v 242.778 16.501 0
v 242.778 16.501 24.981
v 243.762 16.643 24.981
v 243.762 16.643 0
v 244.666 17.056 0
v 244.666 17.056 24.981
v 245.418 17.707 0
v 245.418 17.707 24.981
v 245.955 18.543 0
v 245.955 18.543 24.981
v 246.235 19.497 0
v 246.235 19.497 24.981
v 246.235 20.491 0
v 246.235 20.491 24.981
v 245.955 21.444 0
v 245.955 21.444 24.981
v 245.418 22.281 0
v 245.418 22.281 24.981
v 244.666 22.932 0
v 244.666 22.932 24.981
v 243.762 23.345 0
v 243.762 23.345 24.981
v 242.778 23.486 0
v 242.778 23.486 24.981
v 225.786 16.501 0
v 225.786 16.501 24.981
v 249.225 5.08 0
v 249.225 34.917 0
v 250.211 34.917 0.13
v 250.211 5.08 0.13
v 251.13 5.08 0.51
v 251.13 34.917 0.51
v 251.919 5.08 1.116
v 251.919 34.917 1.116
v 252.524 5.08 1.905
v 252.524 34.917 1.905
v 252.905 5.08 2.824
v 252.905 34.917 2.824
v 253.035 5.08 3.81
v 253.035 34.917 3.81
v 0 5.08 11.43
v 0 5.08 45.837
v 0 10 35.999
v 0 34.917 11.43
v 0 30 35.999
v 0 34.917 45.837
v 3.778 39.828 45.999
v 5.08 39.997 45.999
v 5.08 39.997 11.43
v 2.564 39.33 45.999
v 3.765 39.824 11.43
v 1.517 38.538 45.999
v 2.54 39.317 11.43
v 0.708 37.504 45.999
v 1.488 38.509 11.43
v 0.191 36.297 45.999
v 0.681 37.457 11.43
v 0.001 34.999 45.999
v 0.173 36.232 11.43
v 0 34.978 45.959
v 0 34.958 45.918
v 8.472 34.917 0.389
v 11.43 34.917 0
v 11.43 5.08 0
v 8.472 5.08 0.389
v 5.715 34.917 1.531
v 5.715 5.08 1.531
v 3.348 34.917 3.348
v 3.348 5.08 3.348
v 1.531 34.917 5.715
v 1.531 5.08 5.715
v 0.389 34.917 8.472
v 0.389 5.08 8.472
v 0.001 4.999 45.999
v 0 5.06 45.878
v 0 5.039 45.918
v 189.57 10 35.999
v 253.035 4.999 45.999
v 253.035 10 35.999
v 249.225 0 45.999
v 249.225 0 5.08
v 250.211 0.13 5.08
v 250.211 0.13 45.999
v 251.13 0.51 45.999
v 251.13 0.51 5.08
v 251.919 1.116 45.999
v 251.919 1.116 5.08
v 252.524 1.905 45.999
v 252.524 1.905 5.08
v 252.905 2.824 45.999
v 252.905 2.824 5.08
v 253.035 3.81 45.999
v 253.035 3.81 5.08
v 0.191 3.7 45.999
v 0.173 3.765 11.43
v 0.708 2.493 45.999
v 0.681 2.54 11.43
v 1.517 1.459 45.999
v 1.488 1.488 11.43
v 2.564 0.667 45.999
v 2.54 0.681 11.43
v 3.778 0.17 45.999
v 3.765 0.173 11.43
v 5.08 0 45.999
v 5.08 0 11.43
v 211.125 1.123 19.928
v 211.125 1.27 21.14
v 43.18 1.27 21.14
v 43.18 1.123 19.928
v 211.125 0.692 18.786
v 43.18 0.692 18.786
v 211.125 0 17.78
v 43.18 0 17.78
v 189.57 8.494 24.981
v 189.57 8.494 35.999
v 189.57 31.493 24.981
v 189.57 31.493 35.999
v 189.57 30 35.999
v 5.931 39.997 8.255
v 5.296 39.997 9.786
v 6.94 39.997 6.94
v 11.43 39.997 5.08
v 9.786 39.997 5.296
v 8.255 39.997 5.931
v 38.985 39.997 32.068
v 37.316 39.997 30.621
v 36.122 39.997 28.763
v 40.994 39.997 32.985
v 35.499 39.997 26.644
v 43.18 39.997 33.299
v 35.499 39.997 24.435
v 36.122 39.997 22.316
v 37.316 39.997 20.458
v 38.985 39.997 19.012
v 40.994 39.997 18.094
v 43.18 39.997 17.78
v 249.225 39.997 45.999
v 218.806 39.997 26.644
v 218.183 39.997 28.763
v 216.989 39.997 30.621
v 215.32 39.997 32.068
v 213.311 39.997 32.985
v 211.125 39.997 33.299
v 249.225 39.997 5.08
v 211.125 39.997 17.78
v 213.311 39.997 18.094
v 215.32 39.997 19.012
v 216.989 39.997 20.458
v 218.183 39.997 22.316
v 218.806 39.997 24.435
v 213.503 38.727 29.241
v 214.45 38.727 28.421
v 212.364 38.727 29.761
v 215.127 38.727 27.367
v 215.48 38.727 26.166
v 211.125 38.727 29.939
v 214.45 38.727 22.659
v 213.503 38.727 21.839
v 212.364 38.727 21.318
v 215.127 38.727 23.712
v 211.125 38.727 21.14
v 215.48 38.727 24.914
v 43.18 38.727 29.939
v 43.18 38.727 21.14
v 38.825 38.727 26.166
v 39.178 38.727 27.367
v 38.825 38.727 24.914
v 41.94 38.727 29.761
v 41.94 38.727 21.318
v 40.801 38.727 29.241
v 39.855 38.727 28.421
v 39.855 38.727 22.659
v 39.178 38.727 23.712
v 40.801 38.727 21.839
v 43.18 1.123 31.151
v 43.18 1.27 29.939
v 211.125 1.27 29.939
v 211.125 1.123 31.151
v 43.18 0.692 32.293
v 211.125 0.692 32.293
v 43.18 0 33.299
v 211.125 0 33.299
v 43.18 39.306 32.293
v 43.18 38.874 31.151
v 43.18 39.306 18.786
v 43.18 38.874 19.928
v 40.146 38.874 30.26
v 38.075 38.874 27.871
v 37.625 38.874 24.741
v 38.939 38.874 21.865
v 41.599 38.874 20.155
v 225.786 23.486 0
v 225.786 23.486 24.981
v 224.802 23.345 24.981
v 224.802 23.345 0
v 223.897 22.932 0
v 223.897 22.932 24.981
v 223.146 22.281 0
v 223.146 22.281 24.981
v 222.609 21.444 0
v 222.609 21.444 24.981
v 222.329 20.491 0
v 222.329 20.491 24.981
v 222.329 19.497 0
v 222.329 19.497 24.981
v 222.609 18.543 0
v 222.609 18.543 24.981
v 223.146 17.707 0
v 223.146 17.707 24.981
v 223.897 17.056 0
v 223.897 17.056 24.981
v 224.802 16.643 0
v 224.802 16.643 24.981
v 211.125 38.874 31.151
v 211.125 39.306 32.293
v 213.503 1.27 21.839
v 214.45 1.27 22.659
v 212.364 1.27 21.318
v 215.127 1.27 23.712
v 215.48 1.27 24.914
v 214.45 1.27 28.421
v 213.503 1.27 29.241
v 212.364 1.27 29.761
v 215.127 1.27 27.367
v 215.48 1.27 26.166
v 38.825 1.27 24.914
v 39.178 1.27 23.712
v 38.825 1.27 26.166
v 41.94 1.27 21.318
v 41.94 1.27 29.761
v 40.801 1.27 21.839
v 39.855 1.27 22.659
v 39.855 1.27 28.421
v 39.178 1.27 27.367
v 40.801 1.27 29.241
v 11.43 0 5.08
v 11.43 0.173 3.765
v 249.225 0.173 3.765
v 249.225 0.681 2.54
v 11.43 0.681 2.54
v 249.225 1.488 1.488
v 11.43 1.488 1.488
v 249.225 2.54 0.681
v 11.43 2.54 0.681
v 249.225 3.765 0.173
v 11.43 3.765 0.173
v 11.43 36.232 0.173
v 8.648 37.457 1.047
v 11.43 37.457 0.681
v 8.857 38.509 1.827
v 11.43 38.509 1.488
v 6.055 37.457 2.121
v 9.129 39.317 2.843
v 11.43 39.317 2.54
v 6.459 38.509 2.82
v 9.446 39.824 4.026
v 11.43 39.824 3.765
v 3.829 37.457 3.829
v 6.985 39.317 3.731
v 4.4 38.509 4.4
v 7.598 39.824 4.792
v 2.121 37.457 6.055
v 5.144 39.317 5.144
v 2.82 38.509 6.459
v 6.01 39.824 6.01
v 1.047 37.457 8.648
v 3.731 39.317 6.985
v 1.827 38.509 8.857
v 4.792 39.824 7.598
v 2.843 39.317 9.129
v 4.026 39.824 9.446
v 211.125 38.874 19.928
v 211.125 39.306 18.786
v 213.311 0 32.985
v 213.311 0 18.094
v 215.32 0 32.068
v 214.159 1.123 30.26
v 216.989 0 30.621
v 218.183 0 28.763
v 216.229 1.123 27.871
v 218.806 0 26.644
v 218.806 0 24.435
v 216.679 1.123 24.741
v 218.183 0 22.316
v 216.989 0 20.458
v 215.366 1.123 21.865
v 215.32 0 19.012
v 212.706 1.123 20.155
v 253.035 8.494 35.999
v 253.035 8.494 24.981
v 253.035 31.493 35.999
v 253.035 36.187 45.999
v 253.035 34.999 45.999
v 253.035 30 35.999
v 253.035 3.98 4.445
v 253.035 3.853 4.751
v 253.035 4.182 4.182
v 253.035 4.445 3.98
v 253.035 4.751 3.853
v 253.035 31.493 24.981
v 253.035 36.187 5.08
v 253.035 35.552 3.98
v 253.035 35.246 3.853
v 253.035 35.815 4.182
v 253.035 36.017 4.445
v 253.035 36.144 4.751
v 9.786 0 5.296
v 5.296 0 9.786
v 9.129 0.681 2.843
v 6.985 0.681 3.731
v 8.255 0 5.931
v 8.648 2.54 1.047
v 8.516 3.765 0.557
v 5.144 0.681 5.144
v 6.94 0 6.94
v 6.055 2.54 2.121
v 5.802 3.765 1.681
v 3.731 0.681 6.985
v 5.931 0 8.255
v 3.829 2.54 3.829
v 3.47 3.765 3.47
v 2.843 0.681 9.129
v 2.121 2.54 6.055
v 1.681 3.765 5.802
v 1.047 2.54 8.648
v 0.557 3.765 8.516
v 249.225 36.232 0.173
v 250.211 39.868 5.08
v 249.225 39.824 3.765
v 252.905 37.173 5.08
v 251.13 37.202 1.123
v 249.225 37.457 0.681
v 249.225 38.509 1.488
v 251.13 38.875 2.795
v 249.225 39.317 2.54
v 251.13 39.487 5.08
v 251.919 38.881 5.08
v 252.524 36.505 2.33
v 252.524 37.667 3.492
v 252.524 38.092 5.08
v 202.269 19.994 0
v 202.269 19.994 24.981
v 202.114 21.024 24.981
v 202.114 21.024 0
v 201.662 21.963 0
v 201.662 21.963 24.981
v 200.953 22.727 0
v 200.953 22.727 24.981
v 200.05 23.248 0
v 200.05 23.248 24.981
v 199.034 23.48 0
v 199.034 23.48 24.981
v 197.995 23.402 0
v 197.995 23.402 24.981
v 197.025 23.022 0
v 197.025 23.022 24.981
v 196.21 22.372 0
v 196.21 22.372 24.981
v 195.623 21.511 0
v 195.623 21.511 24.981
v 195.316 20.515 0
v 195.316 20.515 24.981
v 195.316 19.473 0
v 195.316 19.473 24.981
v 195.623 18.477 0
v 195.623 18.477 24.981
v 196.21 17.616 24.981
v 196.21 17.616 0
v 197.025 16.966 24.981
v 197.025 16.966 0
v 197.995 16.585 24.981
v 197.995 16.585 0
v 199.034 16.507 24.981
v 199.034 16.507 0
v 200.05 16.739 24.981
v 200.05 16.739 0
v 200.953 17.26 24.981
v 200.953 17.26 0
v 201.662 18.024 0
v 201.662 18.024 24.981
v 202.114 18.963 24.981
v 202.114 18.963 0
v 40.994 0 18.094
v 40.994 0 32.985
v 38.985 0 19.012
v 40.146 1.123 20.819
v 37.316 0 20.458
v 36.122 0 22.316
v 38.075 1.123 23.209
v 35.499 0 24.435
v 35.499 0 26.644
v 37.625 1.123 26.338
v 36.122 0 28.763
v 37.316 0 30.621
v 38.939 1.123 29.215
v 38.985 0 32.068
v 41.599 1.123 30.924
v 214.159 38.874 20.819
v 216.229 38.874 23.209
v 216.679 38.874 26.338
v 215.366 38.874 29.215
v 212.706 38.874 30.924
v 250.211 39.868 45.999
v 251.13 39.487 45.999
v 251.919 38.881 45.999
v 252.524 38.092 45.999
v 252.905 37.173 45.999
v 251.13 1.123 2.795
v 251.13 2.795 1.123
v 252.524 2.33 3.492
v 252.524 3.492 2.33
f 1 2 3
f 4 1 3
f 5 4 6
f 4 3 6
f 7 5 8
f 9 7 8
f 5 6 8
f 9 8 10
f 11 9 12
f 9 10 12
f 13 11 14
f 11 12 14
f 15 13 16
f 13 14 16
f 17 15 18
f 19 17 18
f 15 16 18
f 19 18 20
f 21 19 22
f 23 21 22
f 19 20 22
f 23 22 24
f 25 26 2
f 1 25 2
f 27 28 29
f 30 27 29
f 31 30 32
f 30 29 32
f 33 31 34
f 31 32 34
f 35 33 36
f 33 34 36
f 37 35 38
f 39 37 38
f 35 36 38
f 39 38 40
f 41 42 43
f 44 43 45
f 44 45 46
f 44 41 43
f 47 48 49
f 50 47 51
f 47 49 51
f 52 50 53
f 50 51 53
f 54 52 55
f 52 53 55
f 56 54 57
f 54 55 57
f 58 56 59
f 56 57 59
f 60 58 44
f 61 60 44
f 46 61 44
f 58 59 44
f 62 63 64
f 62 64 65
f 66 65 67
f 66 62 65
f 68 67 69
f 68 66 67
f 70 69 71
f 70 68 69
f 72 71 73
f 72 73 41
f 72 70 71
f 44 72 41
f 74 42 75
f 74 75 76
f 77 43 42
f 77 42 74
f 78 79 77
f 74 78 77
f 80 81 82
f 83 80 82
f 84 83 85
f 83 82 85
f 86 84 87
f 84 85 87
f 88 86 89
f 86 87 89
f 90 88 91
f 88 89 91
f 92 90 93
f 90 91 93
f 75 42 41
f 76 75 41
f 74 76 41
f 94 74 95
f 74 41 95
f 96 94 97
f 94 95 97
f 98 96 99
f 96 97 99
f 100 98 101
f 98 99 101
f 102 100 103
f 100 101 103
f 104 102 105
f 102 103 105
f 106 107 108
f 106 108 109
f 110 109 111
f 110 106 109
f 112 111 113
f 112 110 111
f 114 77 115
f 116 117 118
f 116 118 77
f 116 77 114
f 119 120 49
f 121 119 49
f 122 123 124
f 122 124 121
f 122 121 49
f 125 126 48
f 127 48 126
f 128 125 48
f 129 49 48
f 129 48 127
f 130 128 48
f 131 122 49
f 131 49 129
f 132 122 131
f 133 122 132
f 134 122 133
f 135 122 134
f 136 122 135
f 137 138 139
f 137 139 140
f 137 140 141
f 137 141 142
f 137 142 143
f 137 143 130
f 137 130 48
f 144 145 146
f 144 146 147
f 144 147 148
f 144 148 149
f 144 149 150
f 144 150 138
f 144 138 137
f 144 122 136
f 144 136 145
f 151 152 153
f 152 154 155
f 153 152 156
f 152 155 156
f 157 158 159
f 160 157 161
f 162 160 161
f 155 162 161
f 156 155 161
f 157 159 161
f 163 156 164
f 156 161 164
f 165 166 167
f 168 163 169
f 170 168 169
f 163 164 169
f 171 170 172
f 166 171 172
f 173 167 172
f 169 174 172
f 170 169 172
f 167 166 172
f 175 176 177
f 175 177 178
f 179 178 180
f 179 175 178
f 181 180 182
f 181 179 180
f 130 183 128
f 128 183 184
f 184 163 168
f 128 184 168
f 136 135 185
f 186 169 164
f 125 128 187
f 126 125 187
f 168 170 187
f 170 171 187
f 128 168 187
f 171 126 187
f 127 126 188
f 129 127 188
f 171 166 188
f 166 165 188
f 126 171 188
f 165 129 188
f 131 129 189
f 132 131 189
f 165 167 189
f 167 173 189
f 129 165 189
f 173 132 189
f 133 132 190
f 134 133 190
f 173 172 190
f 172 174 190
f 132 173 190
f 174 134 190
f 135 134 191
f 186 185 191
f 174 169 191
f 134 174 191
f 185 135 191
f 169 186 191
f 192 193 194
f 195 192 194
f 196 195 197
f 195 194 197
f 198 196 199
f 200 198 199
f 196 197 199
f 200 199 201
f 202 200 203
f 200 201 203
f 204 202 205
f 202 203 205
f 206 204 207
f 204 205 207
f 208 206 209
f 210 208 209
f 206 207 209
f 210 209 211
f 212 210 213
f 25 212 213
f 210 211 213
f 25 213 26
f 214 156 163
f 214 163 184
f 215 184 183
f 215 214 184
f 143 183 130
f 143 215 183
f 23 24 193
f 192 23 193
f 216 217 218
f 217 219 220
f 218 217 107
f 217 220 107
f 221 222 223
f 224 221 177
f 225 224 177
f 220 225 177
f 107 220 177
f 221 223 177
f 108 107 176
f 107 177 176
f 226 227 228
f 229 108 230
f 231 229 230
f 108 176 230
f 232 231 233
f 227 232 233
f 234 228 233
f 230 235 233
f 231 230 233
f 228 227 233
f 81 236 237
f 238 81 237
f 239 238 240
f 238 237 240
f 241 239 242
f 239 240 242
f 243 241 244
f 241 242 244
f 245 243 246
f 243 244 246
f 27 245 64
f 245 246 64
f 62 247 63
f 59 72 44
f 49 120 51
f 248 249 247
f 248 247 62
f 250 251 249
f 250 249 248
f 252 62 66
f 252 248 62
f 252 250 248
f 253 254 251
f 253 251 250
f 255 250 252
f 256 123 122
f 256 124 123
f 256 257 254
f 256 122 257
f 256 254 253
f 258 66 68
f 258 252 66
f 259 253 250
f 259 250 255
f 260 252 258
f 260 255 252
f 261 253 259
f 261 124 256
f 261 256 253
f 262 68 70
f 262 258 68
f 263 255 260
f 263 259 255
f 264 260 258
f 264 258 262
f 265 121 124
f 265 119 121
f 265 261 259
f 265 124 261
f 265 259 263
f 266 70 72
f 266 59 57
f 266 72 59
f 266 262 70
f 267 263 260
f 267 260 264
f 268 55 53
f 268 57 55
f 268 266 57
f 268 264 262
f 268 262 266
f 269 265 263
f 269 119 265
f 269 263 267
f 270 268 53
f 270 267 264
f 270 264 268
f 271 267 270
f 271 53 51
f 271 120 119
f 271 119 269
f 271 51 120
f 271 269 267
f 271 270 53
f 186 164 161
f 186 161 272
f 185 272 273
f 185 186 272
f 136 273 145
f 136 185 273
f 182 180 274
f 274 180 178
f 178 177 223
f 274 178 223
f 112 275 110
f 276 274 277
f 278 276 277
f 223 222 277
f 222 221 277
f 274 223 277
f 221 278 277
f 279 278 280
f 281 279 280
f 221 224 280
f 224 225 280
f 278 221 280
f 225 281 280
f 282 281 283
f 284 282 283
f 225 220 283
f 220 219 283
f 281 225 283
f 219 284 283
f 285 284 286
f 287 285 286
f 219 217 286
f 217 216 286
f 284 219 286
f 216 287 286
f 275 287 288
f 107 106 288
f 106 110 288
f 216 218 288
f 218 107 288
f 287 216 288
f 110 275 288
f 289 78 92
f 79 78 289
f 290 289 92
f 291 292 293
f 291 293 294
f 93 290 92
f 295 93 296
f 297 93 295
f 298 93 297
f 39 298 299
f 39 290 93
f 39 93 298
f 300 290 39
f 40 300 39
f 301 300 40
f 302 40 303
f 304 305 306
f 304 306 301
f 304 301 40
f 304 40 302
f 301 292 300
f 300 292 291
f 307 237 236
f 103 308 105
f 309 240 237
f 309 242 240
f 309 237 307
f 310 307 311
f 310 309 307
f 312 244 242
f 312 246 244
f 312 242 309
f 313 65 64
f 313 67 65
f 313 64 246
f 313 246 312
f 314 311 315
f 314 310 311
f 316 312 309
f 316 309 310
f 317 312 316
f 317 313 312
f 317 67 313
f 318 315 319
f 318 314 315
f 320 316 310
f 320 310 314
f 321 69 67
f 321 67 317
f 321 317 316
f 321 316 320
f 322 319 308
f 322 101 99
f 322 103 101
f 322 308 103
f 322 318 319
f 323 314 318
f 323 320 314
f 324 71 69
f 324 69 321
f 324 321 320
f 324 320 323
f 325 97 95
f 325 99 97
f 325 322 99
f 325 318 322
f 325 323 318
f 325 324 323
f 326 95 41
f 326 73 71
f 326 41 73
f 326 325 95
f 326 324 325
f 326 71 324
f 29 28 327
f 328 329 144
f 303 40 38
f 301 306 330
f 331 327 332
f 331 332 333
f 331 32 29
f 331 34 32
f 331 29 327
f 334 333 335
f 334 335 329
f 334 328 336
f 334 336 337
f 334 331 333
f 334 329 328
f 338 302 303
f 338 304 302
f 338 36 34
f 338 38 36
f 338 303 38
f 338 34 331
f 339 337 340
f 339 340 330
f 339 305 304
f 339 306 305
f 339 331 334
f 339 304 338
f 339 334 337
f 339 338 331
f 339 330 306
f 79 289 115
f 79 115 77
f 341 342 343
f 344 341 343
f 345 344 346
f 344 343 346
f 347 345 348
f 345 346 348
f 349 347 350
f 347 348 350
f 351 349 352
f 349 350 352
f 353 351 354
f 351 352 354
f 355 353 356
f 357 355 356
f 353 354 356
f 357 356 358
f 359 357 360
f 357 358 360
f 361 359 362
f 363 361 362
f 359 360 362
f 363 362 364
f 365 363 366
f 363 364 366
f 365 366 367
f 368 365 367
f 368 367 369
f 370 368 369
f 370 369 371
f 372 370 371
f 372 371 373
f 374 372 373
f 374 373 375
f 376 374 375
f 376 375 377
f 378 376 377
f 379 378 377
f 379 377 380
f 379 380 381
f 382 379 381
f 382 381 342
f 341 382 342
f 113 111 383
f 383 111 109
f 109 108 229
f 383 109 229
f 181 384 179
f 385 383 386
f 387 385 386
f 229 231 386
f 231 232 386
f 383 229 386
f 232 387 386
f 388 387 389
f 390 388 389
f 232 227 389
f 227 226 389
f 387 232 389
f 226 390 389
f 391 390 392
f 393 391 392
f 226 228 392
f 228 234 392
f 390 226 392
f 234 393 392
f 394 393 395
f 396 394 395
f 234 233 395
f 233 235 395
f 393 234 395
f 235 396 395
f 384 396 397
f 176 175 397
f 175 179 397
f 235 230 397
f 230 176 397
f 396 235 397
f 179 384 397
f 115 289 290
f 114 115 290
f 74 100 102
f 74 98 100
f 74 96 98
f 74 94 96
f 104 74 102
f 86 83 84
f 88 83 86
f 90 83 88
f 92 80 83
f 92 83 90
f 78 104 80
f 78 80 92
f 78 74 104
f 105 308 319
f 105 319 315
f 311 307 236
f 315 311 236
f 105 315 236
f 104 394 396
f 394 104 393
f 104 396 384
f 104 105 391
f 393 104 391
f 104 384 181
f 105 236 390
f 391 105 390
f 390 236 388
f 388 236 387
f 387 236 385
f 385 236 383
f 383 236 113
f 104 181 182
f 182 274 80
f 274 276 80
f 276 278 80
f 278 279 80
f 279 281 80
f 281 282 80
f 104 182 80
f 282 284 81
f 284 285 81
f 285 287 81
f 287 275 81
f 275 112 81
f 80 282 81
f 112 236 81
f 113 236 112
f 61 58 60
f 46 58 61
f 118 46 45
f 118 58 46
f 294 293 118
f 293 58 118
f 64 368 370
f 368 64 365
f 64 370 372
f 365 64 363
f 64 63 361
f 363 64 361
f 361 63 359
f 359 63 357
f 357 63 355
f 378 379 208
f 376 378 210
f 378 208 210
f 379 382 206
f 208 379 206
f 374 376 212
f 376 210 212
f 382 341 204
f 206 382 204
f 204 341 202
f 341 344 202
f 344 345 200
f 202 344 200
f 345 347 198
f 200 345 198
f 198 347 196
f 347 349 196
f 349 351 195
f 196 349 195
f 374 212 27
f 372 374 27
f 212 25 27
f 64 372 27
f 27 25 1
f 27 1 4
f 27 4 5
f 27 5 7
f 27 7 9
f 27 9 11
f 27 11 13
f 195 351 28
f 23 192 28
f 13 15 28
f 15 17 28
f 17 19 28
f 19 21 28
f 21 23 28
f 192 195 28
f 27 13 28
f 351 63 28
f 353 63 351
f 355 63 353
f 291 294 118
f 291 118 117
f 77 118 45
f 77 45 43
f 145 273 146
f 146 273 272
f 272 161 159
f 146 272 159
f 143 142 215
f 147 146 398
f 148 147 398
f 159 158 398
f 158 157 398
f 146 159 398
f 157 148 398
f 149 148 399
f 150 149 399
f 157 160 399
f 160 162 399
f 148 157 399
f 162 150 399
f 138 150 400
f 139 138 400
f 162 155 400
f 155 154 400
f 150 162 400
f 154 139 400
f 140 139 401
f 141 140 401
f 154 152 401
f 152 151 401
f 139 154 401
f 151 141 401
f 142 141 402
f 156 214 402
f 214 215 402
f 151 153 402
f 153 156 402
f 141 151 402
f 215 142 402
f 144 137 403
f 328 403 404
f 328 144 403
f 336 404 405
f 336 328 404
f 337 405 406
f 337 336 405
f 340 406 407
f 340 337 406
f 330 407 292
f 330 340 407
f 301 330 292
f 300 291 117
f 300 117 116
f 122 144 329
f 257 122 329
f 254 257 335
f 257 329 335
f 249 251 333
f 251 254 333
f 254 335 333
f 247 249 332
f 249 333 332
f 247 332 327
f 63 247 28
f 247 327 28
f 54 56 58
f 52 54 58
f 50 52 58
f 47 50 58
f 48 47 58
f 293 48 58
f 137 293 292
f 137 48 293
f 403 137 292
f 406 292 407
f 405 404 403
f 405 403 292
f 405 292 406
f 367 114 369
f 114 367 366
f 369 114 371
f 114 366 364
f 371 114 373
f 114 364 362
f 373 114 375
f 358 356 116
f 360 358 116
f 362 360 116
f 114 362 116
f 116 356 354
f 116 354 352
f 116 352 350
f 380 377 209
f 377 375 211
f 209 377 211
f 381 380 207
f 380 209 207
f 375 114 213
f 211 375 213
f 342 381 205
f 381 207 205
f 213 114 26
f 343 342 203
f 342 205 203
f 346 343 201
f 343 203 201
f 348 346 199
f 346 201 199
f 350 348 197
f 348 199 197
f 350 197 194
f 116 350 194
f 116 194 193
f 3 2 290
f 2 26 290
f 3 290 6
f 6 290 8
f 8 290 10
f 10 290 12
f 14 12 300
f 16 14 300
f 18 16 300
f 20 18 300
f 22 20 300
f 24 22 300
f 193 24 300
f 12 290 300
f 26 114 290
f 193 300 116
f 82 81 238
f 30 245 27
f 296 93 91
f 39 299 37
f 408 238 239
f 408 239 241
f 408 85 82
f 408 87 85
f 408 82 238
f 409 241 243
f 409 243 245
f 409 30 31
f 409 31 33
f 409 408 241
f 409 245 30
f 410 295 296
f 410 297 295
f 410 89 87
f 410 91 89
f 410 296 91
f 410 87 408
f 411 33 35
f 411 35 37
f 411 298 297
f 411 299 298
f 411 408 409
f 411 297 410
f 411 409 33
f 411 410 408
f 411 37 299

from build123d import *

# Parameters (mm, degrees)
SKETCH1_W           = 256.8448
SKETCH1_H           = 39.99738
BOSS_EXTRUDE1_DEPTH = 45.9994
CUT_EXTRUDE1_DEPTH  = 264.979140264
SKETCH3_W           = 11.01852
SKETCH3_H           = 22.9997
CUT_EXTRUDE2_DEPTH  = 67.27444
SKETCH4_R           = 3.49631
CUT_EXTRUDE3_DEPTH  = 262.138061298
CUT_EXTRUDE4_DEPTH  = 262.138061298
SKETCH6_W           = 45.9994
SKETCH6_H           = 39.99738
CUT_EXTRUDE5_DEPTH  = 3.81
FILLET1_R           = 3.81
FILLET2_R           = 11.43
FILLET3_R           = 5.08
CUT_EXTRUDE6_DEPTH  = 1.27
FILLET4_R           = 5.08
CUT_EXTRUDE7_DEPTH  = 1.27
FILLET5_R           = 5.08


with BuildPart() as part:
    # Sketch1 → Boss-Extrude1 (new body)
    with BuildSketch(Plane.XY):
        with Locations((128.4224, 19.99869)):
            Rectangle(SKETCH1_W, SKETCH1_H)
    extrude(amount=BOSS_EXTRUDE1_DEPTH)

    # Sketch2 → Cut-Extrude1 (cut, through all)
    with BuildSketch(Plane(origin=(256.8448, 0, 0), x_dir=(0, 0, -1), z_dir=(1, 0, 0))):
        Polygon((-35.99942, 9.99998), (-45.9994, 4.99872), (-45.9994, 34.99866), (-35.99942, 29.99994), align=None)
    extrude(amount=-CUT_EXTRUDE1_DEPTH, mode=Mode.SUBTRACT)

    # Sketch3 → Cut-Extrude2 (cut)
    with BuildSketch(Plane(origin=(256.8448, 0, 0), x_dir=(0, 0, -1), z_dir=(1, 0, 0))):
        with Locations((-30.49016, 19.99361)):
            Rectangle(SKETCH3_W, SKETCH3_H)
    extrude(amount=-CUT_EXTRUDE2_DEPTH, mode=Mode.SUBTRACT)

    # Sketch4 → Cut-Extrude3 (cut, through all)
    with BuildSketch(Plane.XY.offset(24.9809)):
        with Locations((198.77278, 19.99361)):
            Circle(SKETCH4_R)
    extrude(amount=-CUT_EXTRUDE3_DEPTH, mode=Mode.SUBTRACT)

    # Sketch5 → Cut-Extrude4 (cut, through all)
    with BuildSketch(Plane.XY.offset(24.9809)):
        with BuildLine():
            Line((242.77828, 23.48611), (225.78568, 23.48611))
            ThreePointArc((225.78568, 23.48611), (222.29318, 19.99361), (225.78568, 16.50111))
            Line((225.78568, 16.50111), (242.77828, 16.50111))
            ThreePointArc((242.77828, 16.50111), (246.27078, 19.99361), (242.77828, 23.48611))
        make_face()
    extrude(amount=-CUT_EXTRUDE4_DEPTH, mode=Mode.SUBTRACT)

    # Sketch6 → Cut-Extrude5 (cut)
    with BuildSketch(Plane(origin=(256.8448, 0, 0), x_dir=(0, 0, -1), z_dir=(1, 0, 0))):
        with Locations((-22.9997, 19.99869)):
            Rectangle(SKETCH6_W, SKETCH6_H)
    extrude(amount=-CUT_EXTRUDE5_DEPTH, mode=Mode.SUBTRACT)

    # Fillet1
    fillet1_edges = [part.edges().sort_by_distance(p)[0] for p in [
        (253.0348, 19.99869, 0),
        (253.0348, 0, 22.9997),
        (253.0348, 39.99738, 22.9997),
    ]]
    fillet(fillet1_edges, radius=FILLET1_R)

    # Fillet2
    fillet2_edges = [part.edges().sort_by_distance(p)[0] for p in [
        (0, 19.99869, 0),
    ]]
    fillet(fillet2_edges, radius=FILLET2_R)

    # Fillet3
    # the kernel refuses this fillet: 5.08 mm, written as the material it takes off along each edge
    with BuildSketch(Plane(origin=(253.0348, 34.91738, 5.08), x_dir=(0, 0, -1), z_dir=(0, -1, 0))) as fillet3_piece_1:
        with BuildLine():
            CenterArc((1.27, -3.81), 3.81, 0, 90)
            Line((5.08, -3.81), (5.08, 0))
            Line((5.08, 0), (1.27, 0))
        make_face()
    revolve(axis=Axis((253.0348, 34.91738, 5.08), (1, 0, 0)), revolution_arc=90, mode=Mode.SUBTRACT)
    with BuildSketch(Plane(origin=(253.0348, 5.08, 5.08), x_dir=(0, -1, 0), z_dir=(0, 0, 1))) as fillet3_piece_2:
        with BuildLine():
            CenterArc((1.27, -3.81), 3.81, 0, 90)
            Line((5.08, -3.81), (5.08, 0))
            Line((5.08, 0), (1.27, 0))
        make_face()
    revolve(axis=Axis((253.0348, 5.08, 5.08), (1, 0, 0)), revolution_arc=90, mode=Mode.SUBTRACT)
    with BuildSketch(Plane(origin=(0, 0, 11.43), x_dir=(1, 0, 0), z_dir=(0, 0, 1)), Plane(origin=(0, 39.99738, 11.43), x_dir=(0, -1, 0), z_dir=(0, 0, 1))) as fillet3_piece_3:
        with BuildLine():
            CenterArc((FILLET3_R, FILLET3_R), FILLET3_R, 180, 90)
            Line((0, FILLET3_R), (0, 0))
            Line((0, 0), (FILLET3_R, 0))
        make_face()
    extrude(amount=47.2694, mode=Mode.SUBTRACT)
    with BuildSketch(Plane(origin=(11.43, 0, 11.43), x_dir=(0, 0, -1), z_dir=(1, 0, 0))) as fillet3_piece_4:
        with BuildLine():
            CenterArc((11.43 - FILLET3_R, FILLET3_R), FILLET3_R, 270, 90)
            Line((11.43, FILLET3_R), (11.43, 0))
            Line((11.43, 0), (11.43 - FILLET3_R, 0))
        make_face()
    revolve(axis=Axis((11.43, 0, 11.43), (0, 1, 0)), revolution_arc=90, mode=Mode.SUBTRACT)
    with BuildSketch(Plane(origin=(11.43, 39.99738, 11.43), x_dir=(0, 0, -1), z_dir=(1, 0, 0))) as fillet3_piece_5:
        with BuildLine():
            CenterArc((11.43 - FILLET3_R, -FILLET3_R), FILLET3_R, 0, 90)
            Line((11.43 - FILLET3_R, 0), (11.43, 0))
            Line((11.43, 0), (11.43, -FILLET3_R))
        make_face()
    revolve(axis=Axis((11.43, 39.99738, 11.43), (0, 1, 0)), revolution_arc=90, mode=Mode.SUBTRACT)
    with BuildSketch(Plane(origin=(11.43, 0, 0), x_dir=(0, 0, 1), z_dir=(1, 0, 0))) as fillet3_piece_6:
        with BuildLine():
            CenterArc((FILLET3_R, -FILLET3_R), FILLET3_R, 90, 90)
            Line((0, -FILLET3_R), (0, 0))
            Line((0, 0), (FILLET3_R, 0))
        make_face()
    extrude(amount=241.6048, mode=Mode.SUBTRACT)
    with BuildSketch(Plane(origin=(253.0348, 39.99738, 0), x_dir=(0, -1, 0), z_dir=(-1, 0, 0))) as fillet3_piece_7:
        with BuildLine():
            CenterArc((FILLET3_R, FILLET3_R), FILLET3_R, 180, 90)
            Line((0, FILLET3_R), (0, 0))
            Line((0, 0), (FILLET3_R, 0))
        make_face()
    extrude(amount=241.6048, mode=Mode.SUBTRACT)

    # Sketch7 → Cut-Extrude6 (cut)
    with BuildSketch(Plane(origin=(0, 39.99738, 0), x_dir=(1, 0, 0), z_dir=(0, 1, 0))):
        with BuildLine():
            Line((211.1248, -33.2994), (43.18, -33.2994))
            ThreePointArc((43.18, -33.2994), (35.4203, -25.5397), (43.18, -17.78))
            Line((43.18, -17.78), (211.1248, -17.78))
            ThreePointArc((211.1248, -17.78), (218.8845, -25.5397), (211.1248, -33.2994))
        make_face()
    extrude(amount=-CUT_EXTRUDE6_DEPTH, mode=Mode.SUBTRACT)

    # Fillet4
    # the kernel refuses this fillet: 5.08 mm, written as the material it adds along each edge
    with BuildSketch(Plane(origin=(211.1248, 38.72738, 33.2994), x_dir=(0, 1, 0), z_dir=(-1, 0, 0)), Plane(origin=(43.18, 38.72738, 17.78), x_dir=(0, 1, 0), z_dir=(1, 0, 0))) as fillet4_piece_1:
        with BuildLine():
            CenterArc((5.08, 3.360104165), FILLET4_R, 180, 41.409622109)
            Line((0, 3.360104165), (-0.1016, 3.360104165))
            Line((-0.1016, 3.360104165), (-0.1016, 0))
            Line((-0.1016, 0), (0, -0.1016))
            ThreePointArc((0, -0.1016), (0.635, -0.1016), (1.1938, -0.067202083))
            Line((1.1938, -0.067202083), (1.27, 0))
        make_face()
    extrude(amount=167.9448)
    with BuildSketch(Plane(origin=(43.18, 38.72738, 25.5397), x_dir=(0, 0, 1), z_dir=(1, 0, 0))) as fillet4_piece_2:
        with BuildLine():
            CenterArc((4.399595835, -5.08), FILLET4_R, 48.590377891, 41.409622109)
            Line((4.399595835, 0), (4.399595835, 0.1016))
            Line((4.399595835, 0.1016), (7.7597, 0.1016))
            Line((7.7597, 0.1016), (7.8613, 0))
            ThreePointArc((7.8613, 0), (7.8613, -0.635), (7.826902083, -1.1938))
            Line((7.826902083, -1.1938), (7.7597, -1.27))
        make_face()
    revolve(axis=Axis((43.18, 38.72738, 25.5397), (0, -1, 0)), revolution_arc=180)
    with BuildSketch(Plane(origin=(211.1248, 38.72738, 25.5397), x_dir=(0, 0, -1), z_dir=(-1, 0, 0))) as fillet4_piece_3:
        with BuildLine():
            CenterArc((4.399595835, -5.08), FILLET4_R, 48.590377891, 41.409622109)
            Line((4.399595835, 0), (4.399595835, 0.1016))
            Line((4.399595835, 0.1016), (7.7597, 0.1016))
            Line((7.7597, 0.1016), (7.8613, 0))
            ThreePointArc((7.8613, 0), (7.8613, -0.635), (7.826902083, -1.1938))
            Line((7.826902083, -1.1938), (7.7597, -1.27))
        make_face()
    revolve(axis=Axis((211.1248, 38.72738, 25.5397), (0, -1, 0)), revolution_arc=180)

    # Sketch8 → Cut-Extrude7 (cut)
    with BuildSketch(Plane.XZ):
        with BuildLine():
            Line((43.18, 33.2994), (211.1248, 33.2994))
            ThreePointArc((211.1248, 33.2994), (218.8845, 25.5397), (211.1248, 17.78))
            Line((211.1248, 17.78), (43.18, 17.78))
            ThreePointArc((43.18, 17.78), (35.4203, 25.5397), (43.18, 33.2994))
        make_face()
    extrude(amount=-CUT_EXTRUDE7_DEPTH, mode=Mode.SUBTRACT)

    # Fillet5
    # the kernel refuses this fillet: 5.08 mm, written as the material it adds along each edge
    with BuildSketch(Plane(origin=(43.18, 1.27, 33.2994), x_dir=(0, -1, 0), z_dir=(1, 0, 0)), Plane(origin=(211.1248, 1.27, 17.78), x_dir=(0, -1, 0), z_dir=(-1, 0, 0))) as fillet5_piece_1:
        with BuildLine():
            CenterArc((5.08, 3.360104165), FILLET5_R, 180, 41.409622109)
            Line((0, 3.360104165), (-0.1016, 3.360104165))
            Line((-0.1016, 3.360104165), (-0.1016, 0))
            Line((-0.1016, 0), (0, -0.1016))
            ThreePointArc((0, -0.1016), (0.635, -0.1016), (1.1938, -0.067202083))
            Line((1.1938, -0.067202083), (1.27, 0))
        make_face()
    extrude(amount=167.9448)
    with BuildSketch(Plane(origin=(211.1248, 1.27, 25.5397), x_dir=(0, 0, 1), z_dir=(-1, 0, 0))) as fillet5_piece_2:
        with BuildLine():
            CenterArc((4.399595835, -5.08), FILLET5_R, 48.590377891, 41.409622109)
            Line((4.399595835, 0), (4.399595835, 0.1016))
            Line((4.399595835, 0.1016), (7.7597, 0.1016))
            Line((7.7597, 0.1016), (7.8613, 0))
            ThreePointArc((7.8613, 0), (7.8613, -0.635), (7.826902083, -1.1938))
            Line((7.826902083, -1.1938), (7.7597, -1.27))
        make_face()
    revolve(axis=Axis((211.1248, 1.27, 25.5397), (0, 1, 0)), revolution_arc=180)
    with BuildSketch(Plane(origin=(43.18, 1.27, 25.5397), x_dir=(0, 0, -1), z_dir=(1, 0, 0))) as fillet5_piece_3:
        with BuildLine():
            CenterArc((4.399595835, -5.08), FILLET5_R, 48.590377891, 41.409622109)
            Line((4.399595835, 0), (4.399595835, 0.1016))
            Line((4.399595835, 0.1016), (7.7597, 0.1016))
            Line((7.7597, 0.1016), (7.8613, 0))
            ThreePointArc((7.8613, 0), (7.8613, -0.635), (7.826902083, -1.1938))
            Line((7.826902083, -1.1938), (7.7597, -1.27))
        make_face()
    revolve(axis=Axis((43.18, 1.27, 25.5397), (0, 1, 0)), revolution_arc=180)


solid = part.part
